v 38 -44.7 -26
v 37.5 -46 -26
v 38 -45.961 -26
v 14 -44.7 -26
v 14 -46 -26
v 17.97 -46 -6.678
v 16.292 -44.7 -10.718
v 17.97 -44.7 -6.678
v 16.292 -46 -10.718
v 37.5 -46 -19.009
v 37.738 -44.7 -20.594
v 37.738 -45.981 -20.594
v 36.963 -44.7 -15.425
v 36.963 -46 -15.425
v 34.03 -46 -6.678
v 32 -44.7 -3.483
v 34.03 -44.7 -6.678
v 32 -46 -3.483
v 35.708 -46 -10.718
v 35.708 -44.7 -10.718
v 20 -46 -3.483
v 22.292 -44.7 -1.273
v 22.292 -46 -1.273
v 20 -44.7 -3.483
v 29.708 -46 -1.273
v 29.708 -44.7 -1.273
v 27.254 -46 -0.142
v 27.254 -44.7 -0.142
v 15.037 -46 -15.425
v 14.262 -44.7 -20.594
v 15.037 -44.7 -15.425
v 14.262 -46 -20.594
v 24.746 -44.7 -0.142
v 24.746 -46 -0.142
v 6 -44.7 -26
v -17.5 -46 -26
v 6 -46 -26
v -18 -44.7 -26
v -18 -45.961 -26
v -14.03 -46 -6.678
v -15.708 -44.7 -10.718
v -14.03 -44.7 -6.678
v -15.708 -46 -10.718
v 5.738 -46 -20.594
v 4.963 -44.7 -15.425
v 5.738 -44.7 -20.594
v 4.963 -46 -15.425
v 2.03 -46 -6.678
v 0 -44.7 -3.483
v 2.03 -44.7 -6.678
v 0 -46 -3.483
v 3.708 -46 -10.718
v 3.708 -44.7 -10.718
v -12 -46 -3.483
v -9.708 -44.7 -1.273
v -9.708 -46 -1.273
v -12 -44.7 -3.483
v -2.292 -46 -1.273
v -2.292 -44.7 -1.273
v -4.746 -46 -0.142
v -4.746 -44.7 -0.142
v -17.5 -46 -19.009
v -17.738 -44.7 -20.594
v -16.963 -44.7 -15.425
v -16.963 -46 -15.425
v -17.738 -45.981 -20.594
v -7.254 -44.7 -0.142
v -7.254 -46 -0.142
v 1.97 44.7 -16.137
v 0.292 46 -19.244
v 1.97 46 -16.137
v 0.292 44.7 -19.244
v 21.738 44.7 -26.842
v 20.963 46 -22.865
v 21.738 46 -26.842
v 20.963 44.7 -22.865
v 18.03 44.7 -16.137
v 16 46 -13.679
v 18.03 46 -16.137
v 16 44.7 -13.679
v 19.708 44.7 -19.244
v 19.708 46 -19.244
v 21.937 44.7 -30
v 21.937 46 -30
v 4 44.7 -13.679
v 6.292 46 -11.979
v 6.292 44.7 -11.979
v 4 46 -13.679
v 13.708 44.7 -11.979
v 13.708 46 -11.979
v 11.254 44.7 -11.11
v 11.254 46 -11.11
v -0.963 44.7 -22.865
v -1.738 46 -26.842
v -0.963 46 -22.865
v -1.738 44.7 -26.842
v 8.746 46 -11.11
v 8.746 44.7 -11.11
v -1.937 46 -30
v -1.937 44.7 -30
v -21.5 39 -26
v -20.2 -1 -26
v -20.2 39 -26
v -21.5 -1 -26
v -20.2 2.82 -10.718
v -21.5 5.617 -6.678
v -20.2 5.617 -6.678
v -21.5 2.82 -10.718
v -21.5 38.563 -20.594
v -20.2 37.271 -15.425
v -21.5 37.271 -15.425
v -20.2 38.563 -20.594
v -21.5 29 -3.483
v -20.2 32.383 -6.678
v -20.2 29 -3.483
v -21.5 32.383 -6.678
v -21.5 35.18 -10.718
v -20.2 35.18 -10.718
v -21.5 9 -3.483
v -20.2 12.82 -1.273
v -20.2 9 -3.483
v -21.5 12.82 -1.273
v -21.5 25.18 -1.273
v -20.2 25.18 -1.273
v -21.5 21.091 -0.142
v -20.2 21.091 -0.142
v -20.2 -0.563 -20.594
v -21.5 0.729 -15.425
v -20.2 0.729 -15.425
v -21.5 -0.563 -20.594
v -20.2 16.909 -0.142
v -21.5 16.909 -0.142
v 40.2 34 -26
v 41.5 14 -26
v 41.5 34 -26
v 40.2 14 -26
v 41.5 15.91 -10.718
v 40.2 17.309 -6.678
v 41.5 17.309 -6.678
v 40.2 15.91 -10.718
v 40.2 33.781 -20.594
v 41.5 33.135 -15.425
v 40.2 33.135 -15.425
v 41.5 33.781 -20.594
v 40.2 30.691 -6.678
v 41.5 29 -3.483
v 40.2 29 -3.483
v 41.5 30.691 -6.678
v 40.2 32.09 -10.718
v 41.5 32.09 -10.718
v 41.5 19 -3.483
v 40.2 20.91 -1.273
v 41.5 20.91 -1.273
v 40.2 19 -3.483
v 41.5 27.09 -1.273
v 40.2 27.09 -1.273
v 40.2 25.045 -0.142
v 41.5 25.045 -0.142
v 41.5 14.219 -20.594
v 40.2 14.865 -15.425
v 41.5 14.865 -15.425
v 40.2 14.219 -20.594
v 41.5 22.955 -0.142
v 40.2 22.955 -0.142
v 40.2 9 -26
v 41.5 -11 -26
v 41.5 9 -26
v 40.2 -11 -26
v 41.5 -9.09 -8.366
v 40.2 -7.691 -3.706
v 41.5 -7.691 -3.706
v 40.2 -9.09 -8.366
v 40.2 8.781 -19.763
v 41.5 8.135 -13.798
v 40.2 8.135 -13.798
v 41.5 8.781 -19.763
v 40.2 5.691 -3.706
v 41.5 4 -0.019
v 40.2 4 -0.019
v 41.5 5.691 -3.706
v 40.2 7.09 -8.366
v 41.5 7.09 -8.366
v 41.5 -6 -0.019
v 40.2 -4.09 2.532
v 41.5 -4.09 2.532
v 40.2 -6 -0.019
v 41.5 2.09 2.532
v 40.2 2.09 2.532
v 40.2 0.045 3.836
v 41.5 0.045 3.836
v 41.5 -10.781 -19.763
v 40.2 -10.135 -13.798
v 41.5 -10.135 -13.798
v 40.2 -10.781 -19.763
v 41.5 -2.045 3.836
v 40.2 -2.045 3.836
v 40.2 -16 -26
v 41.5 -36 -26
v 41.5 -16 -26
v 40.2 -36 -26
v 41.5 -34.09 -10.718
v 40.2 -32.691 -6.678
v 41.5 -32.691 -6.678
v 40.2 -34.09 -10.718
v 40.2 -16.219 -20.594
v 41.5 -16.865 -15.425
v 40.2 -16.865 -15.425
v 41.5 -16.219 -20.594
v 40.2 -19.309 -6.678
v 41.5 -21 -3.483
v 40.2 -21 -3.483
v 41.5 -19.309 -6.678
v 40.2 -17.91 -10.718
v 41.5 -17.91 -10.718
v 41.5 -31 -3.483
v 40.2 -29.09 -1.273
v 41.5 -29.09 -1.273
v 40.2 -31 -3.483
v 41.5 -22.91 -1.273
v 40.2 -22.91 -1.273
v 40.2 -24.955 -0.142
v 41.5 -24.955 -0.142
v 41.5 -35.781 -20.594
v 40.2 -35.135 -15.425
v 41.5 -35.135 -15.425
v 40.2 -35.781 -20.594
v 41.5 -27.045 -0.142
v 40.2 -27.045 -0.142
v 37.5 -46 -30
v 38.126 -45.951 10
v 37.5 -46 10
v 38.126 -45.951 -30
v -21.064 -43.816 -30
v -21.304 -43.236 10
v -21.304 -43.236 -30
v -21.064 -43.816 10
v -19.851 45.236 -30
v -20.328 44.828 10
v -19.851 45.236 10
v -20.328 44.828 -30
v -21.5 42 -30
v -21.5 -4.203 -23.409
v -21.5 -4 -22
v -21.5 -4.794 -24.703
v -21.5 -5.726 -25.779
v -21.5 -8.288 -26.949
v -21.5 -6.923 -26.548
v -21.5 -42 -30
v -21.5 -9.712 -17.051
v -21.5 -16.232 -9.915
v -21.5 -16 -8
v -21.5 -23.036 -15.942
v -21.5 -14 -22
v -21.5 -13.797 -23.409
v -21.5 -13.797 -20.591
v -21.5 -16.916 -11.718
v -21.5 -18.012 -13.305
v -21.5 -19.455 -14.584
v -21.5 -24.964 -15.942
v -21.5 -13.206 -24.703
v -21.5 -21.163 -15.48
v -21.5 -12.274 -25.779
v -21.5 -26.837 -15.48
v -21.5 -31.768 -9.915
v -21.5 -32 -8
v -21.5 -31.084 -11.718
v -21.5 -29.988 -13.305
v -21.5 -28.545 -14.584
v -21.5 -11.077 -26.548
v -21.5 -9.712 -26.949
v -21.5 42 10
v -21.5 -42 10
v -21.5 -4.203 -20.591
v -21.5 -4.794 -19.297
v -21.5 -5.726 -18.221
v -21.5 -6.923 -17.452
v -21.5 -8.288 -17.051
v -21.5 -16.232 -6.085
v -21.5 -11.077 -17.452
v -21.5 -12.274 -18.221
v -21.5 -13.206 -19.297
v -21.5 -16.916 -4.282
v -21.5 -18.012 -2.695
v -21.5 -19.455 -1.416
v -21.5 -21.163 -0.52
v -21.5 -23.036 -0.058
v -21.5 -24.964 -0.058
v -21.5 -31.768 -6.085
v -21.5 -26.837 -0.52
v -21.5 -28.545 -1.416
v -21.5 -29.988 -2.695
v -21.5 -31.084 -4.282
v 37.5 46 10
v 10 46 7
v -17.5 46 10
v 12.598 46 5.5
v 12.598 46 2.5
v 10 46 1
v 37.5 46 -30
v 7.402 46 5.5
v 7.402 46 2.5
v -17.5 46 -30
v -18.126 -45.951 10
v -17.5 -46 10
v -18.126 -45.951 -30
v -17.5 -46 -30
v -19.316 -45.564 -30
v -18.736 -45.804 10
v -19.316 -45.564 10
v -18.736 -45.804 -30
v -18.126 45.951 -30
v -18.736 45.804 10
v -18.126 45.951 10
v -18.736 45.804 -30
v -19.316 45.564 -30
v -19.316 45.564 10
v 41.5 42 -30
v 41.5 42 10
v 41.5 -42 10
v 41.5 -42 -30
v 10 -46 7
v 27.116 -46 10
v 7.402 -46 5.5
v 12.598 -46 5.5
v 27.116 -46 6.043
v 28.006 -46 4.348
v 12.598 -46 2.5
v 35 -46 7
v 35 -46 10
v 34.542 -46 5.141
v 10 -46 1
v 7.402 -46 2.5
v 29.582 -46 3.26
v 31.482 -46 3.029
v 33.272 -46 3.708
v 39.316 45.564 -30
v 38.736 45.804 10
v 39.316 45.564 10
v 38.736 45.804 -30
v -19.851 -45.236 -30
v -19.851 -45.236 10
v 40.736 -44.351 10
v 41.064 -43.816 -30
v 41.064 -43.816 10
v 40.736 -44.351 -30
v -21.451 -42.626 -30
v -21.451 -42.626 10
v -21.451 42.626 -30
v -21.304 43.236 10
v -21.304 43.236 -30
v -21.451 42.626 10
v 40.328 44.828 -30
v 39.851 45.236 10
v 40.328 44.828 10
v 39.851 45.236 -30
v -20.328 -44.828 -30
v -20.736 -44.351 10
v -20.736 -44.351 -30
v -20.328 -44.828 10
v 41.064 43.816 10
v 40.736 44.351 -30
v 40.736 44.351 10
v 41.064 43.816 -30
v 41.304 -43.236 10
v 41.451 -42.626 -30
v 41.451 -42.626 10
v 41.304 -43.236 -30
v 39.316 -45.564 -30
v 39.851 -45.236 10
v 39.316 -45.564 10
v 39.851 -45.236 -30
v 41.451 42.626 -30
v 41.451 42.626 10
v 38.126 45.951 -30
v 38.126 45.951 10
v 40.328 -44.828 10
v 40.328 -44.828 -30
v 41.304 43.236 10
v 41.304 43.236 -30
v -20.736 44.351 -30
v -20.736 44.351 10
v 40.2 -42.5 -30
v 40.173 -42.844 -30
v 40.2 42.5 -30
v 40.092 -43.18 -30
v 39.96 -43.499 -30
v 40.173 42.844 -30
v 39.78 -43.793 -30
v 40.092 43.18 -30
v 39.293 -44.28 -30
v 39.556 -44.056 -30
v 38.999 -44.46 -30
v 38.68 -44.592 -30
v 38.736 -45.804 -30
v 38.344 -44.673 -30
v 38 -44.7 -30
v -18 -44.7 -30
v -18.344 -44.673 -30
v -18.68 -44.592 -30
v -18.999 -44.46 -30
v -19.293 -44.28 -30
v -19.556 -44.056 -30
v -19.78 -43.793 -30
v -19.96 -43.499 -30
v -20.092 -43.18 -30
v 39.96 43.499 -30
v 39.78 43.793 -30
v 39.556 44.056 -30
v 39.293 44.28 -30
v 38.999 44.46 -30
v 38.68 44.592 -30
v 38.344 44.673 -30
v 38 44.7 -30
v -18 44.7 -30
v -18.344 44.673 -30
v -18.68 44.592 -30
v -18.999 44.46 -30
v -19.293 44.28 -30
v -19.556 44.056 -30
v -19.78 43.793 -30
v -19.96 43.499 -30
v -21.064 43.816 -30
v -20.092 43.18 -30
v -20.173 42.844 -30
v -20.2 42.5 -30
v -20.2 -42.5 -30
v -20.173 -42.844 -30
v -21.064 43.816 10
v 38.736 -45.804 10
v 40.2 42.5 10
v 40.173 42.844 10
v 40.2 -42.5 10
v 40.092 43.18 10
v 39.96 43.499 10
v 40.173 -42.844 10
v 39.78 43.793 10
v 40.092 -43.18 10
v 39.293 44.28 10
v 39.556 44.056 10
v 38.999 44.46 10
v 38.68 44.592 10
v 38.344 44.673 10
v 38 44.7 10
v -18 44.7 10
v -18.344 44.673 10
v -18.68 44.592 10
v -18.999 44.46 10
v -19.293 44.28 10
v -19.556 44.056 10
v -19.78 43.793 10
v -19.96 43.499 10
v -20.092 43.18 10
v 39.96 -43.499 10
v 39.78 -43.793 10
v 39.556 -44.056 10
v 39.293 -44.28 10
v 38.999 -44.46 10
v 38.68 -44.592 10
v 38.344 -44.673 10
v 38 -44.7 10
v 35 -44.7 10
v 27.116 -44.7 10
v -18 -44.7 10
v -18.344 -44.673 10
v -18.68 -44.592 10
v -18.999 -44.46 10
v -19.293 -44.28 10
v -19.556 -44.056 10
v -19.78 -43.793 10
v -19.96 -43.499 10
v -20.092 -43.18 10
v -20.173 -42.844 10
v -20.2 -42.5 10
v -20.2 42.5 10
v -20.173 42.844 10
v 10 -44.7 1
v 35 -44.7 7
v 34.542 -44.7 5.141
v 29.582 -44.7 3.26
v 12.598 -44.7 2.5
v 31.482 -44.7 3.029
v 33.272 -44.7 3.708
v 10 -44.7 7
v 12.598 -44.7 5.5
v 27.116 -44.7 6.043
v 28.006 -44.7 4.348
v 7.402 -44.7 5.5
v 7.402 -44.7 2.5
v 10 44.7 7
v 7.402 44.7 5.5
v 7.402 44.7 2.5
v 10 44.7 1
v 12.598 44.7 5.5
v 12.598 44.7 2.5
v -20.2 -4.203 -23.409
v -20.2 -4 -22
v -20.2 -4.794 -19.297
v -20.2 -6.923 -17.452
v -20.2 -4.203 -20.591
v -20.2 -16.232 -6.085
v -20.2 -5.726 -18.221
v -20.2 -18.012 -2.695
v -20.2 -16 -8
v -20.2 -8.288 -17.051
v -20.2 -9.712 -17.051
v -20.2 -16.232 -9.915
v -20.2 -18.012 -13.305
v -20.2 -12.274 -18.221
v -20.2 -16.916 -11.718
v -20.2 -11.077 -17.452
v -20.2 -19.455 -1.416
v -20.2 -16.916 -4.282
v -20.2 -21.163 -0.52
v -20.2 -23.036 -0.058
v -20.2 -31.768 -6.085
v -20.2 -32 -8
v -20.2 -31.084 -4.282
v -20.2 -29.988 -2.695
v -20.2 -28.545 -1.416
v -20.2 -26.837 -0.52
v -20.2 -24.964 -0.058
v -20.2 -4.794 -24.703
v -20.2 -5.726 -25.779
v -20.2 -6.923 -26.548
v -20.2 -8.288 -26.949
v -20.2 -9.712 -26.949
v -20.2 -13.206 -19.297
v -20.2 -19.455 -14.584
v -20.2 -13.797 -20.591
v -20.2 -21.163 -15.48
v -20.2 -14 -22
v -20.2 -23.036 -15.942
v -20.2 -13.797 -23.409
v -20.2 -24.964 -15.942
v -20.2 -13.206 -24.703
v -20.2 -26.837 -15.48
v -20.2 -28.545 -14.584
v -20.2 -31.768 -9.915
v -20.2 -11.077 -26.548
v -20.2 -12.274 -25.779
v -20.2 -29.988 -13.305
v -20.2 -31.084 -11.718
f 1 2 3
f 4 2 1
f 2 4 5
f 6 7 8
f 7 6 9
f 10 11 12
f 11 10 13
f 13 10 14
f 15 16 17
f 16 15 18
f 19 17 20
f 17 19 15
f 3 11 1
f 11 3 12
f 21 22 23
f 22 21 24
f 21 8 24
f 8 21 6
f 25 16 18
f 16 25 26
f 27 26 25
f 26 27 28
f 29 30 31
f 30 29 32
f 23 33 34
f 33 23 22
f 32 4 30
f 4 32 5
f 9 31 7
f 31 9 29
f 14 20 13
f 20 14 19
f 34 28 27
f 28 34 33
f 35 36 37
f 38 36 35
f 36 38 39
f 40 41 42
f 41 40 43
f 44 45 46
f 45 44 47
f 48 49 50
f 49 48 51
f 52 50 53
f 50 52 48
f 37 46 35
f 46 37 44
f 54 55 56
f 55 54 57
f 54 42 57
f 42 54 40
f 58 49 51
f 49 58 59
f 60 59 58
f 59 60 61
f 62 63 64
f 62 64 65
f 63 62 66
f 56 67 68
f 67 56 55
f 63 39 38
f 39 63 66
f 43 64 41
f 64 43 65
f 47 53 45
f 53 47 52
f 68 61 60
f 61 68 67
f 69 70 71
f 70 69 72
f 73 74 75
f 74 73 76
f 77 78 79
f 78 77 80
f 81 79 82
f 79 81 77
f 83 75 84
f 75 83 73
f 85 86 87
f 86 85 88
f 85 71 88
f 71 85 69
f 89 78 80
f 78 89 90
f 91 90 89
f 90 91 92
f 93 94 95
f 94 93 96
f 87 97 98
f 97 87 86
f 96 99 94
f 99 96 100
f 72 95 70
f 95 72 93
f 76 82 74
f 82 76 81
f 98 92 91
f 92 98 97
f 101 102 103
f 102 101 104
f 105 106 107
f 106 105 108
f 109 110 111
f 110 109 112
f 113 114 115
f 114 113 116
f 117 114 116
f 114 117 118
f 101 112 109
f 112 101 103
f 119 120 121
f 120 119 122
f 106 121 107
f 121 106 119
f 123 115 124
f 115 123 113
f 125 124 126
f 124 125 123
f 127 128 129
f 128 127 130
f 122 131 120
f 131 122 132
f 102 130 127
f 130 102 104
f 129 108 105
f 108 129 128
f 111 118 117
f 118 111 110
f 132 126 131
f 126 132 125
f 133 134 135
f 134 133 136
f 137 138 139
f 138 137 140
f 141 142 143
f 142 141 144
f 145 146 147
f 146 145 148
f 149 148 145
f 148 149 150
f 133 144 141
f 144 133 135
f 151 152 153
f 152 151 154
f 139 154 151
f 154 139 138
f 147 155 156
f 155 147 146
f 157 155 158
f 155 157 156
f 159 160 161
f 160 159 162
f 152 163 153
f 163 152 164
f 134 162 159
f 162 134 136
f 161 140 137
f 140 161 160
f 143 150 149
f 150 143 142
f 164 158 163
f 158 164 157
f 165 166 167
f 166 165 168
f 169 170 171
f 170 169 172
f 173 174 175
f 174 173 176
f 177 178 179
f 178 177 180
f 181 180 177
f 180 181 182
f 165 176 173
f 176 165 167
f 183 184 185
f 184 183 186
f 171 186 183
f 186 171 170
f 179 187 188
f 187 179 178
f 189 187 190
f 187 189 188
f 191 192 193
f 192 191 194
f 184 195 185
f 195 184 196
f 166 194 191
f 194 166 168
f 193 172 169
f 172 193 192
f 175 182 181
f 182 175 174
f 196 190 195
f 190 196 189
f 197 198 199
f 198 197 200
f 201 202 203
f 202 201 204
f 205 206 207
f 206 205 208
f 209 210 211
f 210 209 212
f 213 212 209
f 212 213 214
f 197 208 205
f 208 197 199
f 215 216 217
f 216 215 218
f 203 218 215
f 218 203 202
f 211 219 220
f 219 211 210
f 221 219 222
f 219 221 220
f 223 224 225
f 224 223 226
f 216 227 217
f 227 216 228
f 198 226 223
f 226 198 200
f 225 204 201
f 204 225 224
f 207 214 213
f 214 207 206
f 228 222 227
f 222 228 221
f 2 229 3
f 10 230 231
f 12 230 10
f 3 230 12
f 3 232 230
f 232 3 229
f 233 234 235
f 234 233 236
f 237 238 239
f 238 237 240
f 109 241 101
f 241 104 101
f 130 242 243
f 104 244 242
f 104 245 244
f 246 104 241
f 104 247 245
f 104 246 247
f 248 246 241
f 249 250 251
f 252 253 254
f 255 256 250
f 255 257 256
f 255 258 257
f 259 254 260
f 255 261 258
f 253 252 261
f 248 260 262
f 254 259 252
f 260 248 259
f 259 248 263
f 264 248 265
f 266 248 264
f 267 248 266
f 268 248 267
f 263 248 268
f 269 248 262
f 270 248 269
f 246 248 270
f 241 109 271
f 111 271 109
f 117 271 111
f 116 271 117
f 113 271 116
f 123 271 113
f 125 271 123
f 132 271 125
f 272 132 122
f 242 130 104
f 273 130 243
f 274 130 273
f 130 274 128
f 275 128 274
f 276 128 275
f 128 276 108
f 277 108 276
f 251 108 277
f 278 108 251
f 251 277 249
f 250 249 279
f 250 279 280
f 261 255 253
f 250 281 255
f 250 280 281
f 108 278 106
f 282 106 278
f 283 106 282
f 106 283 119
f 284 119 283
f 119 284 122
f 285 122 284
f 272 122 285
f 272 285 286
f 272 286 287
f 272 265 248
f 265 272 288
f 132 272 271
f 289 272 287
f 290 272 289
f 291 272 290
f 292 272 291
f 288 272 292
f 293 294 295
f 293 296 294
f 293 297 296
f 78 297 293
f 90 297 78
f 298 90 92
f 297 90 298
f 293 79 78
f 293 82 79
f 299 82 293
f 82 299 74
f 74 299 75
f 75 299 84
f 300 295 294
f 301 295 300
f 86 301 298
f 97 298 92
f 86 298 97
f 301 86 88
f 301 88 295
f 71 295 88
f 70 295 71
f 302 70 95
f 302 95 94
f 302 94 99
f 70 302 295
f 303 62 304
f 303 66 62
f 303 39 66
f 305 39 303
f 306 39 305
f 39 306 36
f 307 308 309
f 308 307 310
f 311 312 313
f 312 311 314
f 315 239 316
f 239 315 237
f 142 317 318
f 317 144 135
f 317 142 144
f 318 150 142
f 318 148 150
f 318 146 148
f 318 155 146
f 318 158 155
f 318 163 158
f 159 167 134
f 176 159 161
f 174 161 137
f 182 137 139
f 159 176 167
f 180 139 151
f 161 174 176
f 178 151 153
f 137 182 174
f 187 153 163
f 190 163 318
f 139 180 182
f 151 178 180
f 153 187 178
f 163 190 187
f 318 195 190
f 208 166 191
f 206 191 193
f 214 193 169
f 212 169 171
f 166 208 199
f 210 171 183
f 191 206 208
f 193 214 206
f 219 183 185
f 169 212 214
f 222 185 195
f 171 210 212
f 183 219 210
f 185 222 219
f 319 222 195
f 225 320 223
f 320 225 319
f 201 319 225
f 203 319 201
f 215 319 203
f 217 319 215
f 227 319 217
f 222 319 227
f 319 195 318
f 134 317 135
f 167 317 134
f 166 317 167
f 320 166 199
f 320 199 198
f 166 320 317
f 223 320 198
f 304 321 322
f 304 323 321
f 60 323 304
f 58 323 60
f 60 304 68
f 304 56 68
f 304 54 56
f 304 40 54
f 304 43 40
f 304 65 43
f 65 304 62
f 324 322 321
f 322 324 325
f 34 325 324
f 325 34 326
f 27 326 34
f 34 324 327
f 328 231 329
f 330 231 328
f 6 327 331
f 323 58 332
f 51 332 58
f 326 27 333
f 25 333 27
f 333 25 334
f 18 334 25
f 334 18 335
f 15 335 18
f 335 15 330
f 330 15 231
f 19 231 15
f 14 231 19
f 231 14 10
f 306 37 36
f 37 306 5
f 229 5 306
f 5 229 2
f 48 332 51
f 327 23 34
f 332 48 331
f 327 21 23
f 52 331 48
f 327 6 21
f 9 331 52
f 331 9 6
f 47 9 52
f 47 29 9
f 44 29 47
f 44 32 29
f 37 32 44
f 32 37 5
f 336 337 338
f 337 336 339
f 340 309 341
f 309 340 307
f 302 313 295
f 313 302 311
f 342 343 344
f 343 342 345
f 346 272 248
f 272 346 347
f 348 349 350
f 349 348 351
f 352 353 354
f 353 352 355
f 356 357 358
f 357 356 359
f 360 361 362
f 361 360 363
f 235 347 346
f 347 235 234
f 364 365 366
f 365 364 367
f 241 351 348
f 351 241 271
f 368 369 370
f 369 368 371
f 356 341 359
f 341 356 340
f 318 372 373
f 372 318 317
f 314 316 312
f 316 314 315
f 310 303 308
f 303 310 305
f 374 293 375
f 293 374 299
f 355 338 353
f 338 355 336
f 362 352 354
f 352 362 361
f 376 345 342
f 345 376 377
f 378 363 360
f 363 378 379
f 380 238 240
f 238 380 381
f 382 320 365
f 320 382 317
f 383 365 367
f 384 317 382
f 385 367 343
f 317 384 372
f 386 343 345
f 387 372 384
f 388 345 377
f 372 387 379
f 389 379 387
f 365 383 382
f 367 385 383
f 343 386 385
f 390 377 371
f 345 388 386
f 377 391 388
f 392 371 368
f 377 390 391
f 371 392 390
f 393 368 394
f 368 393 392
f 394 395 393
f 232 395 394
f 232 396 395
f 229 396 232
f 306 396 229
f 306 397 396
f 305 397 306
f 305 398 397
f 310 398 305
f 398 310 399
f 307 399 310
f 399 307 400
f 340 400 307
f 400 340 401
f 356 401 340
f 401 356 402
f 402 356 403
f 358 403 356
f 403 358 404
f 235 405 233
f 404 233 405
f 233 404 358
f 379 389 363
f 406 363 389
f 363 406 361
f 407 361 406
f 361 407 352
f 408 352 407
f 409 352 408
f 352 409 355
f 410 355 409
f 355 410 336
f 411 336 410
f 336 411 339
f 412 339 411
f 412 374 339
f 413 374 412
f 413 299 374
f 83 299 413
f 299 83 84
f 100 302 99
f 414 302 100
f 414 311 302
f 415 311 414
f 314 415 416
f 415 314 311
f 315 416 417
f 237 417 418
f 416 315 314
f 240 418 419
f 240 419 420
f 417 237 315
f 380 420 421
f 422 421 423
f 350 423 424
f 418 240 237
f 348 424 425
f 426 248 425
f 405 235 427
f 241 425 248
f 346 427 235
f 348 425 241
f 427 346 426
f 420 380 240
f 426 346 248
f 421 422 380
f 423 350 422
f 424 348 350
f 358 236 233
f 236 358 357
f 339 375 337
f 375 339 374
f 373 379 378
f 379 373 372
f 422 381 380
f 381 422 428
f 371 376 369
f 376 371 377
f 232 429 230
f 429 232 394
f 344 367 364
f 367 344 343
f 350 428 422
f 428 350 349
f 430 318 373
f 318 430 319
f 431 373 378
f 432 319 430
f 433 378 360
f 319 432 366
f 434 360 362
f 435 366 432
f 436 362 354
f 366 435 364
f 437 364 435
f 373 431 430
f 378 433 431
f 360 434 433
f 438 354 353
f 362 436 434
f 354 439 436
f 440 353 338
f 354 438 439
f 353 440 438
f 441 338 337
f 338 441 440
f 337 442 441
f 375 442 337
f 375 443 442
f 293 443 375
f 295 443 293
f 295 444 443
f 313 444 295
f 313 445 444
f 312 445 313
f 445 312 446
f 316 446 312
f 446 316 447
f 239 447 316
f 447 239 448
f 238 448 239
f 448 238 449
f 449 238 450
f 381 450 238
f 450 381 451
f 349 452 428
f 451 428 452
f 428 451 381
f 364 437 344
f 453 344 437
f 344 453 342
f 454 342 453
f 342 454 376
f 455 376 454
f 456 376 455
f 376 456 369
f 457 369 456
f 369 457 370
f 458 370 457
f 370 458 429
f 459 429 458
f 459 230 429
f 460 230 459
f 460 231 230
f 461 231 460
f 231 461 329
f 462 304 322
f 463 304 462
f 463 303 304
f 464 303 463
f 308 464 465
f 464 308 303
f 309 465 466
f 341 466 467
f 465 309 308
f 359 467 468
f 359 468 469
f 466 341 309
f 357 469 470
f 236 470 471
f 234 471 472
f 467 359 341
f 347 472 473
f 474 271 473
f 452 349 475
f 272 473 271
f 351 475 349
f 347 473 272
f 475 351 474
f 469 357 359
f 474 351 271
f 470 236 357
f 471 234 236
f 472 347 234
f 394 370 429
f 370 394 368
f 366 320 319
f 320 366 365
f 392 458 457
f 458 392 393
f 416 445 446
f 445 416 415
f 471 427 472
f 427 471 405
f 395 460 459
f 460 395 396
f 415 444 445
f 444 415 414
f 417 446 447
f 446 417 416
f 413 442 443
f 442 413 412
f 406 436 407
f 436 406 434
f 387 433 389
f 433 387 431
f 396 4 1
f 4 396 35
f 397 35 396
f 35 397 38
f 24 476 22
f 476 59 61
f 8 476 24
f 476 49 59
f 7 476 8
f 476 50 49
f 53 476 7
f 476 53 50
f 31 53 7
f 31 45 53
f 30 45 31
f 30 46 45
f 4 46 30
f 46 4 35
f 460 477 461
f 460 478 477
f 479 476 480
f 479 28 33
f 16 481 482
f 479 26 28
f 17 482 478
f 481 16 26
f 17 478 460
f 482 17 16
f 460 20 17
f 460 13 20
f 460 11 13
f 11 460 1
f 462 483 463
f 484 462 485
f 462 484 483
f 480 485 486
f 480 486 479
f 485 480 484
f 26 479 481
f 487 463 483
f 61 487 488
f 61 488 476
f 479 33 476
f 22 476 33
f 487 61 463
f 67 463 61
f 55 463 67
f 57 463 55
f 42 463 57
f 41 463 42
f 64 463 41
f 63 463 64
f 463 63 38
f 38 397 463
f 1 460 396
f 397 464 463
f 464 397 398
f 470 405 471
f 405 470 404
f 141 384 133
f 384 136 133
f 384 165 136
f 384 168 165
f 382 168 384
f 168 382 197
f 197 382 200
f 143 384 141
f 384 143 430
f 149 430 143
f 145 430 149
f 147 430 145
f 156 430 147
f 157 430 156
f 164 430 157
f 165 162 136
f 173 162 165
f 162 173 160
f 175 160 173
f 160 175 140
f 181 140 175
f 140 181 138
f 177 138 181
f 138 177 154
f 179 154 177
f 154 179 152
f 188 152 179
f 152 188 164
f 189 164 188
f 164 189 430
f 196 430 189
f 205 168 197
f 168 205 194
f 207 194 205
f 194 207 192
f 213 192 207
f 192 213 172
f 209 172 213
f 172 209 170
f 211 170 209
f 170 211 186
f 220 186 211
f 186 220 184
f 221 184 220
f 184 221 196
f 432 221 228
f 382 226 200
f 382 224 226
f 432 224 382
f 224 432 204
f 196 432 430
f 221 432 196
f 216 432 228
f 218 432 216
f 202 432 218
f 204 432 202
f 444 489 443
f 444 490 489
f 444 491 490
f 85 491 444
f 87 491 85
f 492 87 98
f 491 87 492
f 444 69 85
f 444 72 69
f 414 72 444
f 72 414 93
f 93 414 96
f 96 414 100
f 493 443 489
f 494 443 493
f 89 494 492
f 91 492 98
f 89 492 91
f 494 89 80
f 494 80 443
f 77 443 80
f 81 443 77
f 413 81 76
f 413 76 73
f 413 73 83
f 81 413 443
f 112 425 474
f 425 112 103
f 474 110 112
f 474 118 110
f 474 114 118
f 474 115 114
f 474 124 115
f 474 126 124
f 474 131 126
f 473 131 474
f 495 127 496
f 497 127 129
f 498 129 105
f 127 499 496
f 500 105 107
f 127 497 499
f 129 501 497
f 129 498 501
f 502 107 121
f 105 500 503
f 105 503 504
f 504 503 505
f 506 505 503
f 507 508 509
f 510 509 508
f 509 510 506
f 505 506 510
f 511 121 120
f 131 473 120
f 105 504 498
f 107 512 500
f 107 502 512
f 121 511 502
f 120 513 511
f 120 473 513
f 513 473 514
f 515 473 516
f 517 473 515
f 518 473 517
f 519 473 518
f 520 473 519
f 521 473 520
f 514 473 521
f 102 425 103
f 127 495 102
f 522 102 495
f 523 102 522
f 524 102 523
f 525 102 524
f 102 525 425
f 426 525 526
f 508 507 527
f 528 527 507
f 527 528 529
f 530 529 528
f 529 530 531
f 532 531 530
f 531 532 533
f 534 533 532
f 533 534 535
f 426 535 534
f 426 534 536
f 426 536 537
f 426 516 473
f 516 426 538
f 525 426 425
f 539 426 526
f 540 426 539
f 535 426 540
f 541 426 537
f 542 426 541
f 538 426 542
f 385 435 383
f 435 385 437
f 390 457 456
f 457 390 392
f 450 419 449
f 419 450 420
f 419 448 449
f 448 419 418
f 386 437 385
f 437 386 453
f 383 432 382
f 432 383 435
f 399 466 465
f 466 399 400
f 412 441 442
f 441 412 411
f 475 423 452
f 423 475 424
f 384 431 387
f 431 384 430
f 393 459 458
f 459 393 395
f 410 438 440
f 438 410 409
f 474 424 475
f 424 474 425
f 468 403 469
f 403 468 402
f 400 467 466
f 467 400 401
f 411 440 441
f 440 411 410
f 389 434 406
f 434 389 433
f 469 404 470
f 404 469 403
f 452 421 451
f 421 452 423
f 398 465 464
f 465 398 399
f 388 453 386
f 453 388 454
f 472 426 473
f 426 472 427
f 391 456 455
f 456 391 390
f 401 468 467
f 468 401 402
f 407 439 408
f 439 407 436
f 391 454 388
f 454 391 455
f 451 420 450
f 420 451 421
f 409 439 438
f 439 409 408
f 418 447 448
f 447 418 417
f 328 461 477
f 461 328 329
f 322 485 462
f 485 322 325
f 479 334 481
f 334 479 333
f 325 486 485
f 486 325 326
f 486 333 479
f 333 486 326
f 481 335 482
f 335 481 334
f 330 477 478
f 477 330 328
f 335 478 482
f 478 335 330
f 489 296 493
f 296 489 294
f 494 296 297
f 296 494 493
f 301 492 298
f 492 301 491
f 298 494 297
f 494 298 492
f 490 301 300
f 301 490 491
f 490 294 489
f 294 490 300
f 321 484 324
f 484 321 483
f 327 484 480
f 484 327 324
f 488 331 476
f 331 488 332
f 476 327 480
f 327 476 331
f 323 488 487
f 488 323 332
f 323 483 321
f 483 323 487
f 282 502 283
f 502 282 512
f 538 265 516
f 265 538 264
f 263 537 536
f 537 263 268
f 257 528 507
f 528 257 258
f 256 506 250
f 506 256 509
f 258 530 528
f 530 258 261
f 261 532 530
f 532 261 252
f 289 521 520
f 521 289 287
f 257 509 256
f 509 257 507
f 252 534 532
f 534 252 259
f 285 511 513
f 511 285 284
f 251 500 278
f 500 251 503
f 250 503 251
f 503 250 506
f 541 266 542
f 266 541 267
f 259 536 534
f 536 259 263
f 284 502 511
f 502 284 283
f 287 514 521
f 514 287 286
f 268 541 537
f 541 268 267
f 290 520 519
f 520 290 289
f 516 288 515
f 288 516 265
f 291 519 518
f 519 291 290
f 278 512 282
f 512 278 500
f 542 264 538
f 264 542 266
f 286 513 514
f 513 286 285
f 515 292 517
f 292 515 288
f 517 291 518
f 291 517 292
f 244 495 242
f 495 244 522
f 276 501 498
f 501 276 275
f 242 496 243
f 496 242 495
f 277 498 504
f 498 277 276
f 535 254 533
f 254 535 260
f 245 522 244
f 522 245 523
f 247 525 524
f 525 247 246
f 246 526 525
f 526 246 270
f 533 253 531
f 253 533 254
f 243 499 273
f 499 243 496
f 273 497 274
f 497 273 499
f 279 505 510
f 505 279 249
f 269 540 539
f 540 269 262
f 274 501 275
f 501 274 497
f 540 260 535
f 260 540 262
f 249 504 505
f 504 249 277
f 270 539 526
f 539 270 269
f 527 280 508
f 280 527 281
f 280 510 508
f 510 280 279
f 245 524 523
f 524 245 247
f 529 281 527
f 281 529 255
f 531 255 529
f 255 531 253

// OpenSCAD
// shell

module shell1(){
// top shell
translate([10,0,-30]){
    difference(){
        // boss
        linear_extrude(height=40)
        offset(r=4,$fn=40)
        square([55,84],center=true);

        // main cut
        translate([0,0,-1])
        linear_extrude(height=41+2)
        offset(r=2+0.2,$fn=40)
        square([56,85],center=true);

        // cut for power plug
        hull(){
            translate([21,-46,50])
            rotate([-90,0,0])
            cylinder(r=4,h=10,center=true);

            translate([21,-46,37])
            rotate([-90,0,0])
            cylinder(r=4,h=10,center=true);
        }
        
        // cut for usb and ethernet
        translate([16,-46,4])
        scale([0.6,1,1.3])
        intersection(){
            translate([0,0,20])
            cube([40,10,40],center=true);
        
            rotate([-90,0,0])
            cylinder(r=20,h=10,center=true);
        }
        translate([-16,-46,4])
        scale([0.6,1,1.3])
        intersection(){
            translate([0,0,20])
            cube([40,10,40],center=true);
        
            rotate([-90,0,0])
            cylinder(r=20,h=10,center=true);
        }

        // cut for sd card
        translate([0,46,-1])
        scale([0.6,1,1])
        intersection(){
            translate([0,0,20])
            cube([40,10,40],center=true);
        
            rotate([-90,0,0])
            cylinder(r=20,h=10,center=true);
        }

        // cut for locking button
        translate([0,46,34])
        rotate([-90,30,0])
        cylinder(r=3,h=10,center=true,$fn=6);

        // cut for locking button
        translate([0,-46,34])
        rotate([-90,30,0])
        cylinder(r=3,h=10,center=true,$fn=6);

        // cut for usb power and hdmi
        translate([-30,19,4])
        rotate([0,0,90])
        scale([1.0,1,1.3])
        intersection(){
            translate([0,0,20])
            cube([40,10,40],center=true);
        
            rotate([-90,0,0])
            cylinder(r=20,h=10,center=true);
        }
        // round window cut
        translate([-30,-24,22])
        rotate([0,0,90])
        rotate([-90,0,0])
        cylinder(r=8,h=10,center=true);

        // audio cut
        translate([-30,-9,8])
        rotate([0,0,90])
        rotate([-90,0,0])
        cylinder(r=5,h=10,center=true,$fn=22);

        // back wall cuts
        translate([30,24,4])
        rotate([0,0,90])
        scale([0.5,1,1.3])
        intersection(){
            translate([0,0,20])
            cube([40,10,40],center=true);
        
            rotate([-90,0,0])
            cylinder(r=20,h=10,center=true);
        }
        // back wall cuts
        translate([30,24-25,4])
        rotate([0,0,90])
        scale([0.5,1,1.5])
        intersection(){
            translate([0,0,20])
            cube([40,10,40],center=true);
        
            rotate([-90,0,0])
            cylinder(r=20,h=10,center=true);
        }
        // back wall cuts
        translate([30,24-50,4])
        rotate([0,0,90])
        scale([0.5,1,1.3])
        intersection(){
            translate([0,0,20])
            cube([40,10,40],center=true);
        
            rotate([-90,0,0])
            cylinder(r=20,h=10,center=true);
        }
    }
}
}

//==============================

shell1();
